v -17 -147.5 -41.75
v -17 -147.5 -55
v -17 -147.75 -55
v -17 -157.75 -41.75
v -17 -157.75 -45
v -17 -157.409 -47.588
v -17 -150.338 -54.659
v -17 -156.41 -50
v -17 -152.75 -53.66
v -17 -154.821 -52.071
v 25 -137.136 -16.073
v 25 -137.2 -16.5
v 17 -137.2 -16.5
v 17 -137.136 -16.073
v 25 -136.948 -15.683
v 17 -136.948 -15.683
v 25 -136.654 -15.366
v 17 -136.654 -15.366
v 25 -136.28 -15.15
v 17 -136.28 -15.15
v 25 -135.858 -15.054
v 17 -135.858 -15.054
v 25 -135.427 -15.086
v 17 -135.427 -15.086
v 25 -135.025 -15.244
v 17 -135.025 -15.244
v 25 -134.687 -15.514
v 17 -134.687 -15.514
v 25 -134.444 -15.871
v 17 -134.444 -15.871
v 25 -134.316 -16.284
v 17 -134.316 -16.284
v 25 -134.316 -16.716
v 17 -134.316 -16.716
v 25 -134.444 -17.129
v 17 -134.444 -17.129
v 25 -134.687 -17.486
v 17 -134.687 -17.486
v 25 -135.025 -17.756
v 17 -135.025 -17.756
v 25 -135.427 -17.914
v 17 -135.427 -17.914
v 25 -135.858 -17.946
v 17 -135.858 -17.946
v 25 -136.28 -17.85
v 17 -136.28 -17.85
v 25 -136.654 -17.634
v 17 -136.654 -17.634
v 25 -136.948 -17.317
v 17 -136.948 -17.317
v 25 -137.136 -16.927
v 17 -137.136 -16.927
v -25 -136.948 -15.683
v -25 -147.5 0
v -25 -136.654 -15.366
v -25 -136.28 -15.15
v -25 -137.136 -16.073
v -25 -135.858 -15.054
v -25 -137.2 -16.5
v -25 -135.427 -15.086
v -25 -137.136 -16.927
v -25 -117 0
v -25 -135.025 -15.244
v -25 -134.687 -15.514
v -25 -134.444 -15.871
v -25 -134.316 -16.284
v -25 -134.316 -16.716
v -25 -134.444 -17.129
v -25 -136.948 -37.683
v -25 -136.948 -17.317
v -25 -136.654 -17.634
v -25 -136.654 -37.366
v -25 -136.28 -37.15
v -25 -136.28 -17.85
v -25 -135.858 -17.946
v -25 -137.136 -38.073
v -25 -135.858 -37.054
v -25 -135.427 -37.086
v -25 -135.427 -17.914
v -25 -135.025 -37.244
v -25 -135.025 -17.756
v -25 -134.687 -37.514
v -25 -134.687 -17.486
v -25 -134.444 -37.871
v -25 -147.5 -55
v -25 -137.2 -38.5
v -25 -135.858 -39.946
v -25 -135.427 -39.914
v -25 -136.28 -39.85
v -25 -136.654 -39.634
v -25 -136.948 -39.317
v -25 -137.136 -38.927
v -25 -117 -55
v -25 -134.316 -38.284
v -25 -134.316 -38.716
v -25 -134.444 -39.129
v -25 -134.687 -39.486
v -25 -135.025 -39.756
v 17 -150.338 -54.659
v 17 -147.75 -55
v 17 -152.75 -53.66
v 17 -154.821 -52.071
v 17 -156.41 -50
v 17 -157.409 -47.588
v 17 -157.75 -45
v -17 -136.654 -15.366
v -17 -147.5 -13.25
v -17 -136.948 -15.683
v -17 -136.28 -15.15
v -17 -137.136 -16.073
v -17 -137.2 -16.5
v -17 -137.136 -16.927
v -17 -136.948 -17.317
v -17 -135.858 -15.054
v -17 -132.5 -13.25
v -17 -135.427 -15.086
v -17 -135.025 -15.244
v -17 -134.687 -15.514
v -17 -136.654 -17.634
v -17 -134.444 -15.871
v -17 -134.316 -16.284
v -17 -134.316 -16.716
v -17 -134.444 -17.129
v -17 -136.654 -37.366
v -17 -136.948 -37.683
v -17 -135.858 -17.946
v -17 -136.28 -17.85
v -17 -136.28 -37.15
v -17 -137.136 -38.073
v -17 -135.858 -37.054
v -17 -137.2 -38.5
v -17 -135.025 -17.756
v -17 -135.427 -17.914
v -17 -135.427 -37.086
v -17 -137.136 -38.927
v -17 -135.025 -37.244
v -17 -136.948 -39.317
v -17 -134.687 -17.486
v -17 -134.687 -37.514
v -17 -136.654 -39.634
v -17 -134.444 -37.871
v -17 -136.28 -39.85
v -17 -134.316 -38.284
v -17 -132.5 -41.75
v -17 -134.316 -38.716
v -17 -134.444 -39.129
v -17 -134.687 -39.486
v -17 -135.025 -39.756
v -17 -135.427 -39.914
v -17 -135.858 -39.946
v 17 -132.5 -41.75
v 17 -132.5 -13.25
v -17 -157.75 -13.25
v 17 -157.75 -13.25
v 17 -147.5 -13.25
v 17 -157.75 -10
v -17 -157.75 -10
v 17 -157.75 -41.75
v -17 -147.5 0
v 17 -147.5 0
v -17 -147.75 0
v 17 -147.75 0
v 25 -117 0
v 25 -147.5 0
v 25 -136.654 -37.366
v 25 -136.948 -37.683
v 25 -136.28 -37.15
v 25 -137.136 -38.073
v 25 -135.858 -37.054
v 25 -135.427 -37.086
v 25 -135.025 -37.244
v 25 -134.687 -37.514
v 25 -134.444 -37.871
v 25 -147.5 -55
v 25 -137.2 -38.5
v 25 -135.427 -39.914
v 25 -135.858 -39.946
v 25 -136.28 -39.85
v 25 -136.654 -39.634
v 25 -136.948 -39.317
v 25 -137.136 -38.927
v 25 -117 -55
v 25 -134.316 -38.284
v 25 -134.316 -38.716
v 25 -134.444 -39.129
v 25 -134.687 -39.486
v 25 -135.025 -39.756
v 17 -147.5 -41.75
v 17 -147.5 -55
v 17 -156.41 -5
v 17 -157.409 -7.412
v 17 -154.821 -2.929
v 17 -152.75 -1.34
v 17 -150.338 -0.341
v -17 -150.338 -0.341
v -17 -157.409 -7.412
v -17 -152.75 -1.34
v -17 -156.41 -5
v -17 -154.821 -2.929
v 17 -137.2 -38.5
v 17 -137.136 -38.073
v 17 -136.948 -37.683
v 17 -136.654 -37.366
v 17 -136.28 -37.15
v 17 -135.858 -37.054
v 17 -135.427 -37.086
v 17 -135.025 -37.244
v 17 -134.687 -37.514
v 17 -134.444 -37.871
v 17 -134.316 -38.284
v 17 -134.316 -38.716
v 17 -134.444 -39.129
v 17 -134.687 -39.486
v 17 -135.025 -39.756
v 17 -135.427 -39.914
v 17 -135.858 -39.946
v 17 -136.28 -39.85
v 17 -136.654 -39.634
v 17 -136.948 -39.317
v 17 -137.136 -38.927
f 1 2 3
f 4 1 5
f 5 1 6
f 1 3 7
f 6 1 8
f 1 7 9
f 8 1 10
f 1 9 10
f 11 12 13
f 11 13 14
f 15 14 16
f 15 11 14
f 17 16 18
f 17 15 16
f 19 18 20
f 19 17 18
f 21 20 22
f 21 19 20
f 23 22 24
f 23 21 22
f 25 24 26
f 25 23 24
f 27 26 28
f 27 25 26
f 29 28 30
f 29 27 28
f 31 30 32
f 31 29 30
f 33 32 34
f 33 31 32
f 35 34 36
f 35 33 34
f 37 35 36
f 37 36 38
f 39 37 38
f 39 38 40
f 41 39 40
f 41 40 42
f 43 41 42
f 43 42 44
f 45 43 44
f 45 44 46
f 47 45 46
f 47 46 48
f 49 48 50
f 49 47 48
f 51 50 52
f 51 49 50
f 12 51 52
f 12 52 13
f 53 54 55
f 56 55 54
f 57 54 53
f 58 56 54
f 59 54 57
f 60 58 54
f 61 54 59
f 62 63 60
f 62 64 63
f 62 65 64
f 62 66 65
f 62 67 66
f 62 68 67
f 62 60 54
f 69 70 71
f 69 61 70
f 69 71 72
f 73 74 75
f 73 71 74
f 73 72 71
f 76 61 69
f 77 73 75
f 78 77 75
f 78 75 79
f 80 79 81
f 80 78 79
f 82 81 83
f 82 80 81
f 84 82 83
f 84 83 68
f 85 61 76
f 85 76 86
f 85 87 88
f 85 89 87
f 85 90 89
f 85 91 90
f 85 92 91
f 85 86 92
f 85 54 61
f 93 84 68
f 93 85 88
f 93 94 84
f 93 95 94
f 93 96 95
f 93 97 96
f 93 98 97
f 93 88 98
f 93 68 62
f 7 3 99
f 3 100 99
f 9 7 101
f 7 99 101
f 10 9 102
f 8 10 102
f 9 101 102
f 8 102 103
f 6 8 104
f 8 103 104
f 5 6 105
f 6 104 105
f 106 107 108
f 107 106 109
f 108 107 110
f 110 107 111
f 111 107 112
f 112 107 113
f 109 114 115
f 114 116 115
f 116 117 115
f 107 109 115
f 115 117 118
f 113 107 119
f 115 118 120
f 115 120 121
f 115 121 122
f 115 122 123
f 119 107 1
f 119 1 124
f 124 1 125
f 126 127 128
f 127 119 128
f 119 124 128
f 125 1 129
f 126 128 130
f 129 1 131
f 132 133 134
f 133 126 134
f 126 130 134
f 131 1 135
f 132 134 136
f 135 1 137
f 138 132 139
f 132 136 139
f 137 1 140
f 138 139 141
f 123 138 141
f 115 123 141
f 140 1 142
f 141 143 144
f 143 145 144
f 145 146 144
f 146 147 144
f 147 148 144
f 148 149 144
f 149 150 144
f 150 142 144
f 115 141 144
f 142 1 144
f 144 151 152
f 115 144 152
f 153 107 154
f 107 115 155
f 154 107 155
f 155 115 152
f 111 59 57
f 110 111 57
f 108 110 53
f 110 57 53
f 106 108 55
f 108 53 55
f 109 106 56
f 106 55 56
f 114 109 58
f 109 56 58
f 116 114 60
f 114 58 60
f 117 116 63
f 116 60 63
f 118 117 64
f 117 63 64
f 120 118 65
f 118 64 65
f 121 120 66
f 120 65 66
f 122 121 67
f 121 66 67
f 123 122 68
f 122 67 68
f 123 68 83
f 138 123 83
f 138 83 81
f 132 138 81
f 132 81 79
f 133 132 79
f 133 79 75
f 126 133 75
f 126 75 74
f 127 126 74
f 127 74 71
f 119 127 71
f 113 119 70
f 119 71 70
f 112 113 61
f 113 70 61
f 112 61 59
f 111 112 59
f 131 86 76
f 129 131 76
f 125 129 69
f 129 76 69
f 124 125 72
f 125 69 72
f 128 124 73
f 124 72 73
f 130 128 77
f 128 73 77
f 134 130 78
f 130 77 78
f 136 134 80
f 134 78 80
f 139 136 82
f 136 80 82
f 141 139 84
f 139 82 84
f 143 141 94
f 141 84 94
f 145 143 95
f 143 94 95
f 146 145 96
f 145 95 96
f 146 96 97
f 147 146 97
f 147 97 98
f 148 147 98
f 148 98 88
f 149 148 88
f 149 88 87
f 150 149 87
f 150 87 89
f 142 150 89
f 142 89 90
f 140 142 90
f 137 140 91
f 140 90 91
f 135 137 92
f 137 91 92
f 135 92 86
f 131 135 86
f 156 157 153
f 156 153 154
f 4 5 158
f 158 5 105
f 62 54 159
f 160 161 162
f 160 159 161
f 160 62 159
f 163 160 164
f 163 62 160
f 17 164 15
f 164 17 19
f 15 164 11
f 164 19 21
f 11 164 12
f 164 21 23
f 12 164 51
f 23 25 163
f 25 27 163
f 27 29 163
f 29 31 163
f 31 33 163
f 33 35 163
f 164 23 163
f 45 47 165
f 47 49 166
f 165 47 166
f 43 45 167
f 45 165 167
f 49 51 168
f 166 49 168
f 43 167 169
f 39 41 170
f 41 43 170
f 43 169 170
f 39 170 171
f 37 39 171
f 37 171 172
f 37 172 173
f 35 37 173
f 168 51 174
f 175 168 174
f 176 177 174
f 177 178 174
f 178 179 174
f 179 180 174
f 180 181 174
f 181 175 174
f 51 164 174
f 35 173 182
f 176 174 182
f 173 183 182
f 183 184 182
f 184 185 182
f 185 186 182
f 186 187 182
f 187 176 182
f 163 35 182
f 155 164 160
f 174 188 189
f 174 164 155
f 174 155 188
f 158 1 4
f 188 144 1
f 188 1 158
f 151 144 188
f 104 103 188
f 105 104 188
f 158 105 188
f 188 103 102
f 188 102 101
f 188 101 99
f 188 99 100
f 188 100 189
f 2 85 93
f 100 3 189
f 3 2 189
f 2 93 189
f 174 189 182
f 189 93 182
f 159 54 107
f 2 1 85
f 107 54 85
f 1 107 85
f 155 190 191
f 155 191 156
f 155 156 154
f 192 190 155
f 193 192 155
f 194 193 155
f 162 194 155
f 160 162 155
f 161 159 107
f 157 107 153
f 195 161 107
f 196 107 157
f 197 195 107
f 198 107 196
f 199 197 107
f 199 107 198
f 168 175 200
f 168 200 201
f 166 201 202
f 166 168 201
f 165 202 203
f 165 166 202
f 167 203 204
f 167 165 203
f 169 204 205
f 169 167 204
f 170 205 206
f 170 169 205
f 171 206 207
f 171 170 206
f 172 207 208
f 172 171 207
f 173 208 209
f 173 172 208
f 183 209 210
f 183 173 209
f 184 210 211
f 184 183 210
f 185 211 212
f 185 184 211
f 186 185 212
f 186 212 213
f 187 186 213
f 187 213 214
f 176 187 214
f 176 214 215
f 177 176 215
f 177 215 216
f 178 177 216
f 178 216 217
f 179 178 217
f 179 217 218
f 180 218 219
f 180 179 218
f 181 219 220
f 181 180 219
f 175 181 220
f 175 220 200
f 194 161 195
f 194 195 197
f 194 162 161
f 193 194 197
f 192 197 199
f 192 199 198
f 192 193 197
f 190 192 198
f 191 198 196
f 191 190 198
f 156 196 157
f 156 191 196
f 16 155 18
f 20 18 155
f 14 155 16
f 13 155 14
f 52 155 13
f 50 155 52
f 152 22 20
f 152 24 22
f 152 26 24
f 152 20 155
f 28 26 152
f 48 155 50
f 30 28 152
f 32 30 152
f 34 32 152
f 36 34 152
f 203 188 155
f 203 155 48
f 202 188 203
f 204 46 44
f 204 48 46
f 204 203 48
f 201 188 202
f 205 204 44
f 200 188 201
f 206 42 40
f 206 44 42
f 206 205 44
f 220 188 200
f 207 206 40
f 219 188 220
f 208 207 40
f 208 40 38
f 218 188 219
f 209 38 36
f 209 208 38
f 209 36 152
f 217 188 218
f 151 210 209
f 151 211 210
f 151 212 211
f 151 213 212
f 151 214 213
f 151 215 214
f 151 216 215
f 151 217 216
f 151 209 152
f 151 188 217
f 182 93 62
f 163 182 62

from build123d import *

# Parameters (mm, degrees)
SKETCH1_W           = 50
SKETCH1_H           = 170
BOSS_EXTRUDE1_DEPTH = 55
SKETCH2_W           = 34
SKETCH2_H           = 27
CUT_EXTRUDE1_DEPTH  = 181.416185527
SKETCH3_W           = 10
SKETCH3_H           = 24
SKETCH3_R           = 4.25
SKETCH3_R_2         = 1
CUT_EXTRUDE2_DEPTH  = 186.539753153
SKETCH4_W           = 2
SKETCH4_H           = 24
CUT_EXTRUDE3_DEPTH  = 178.623196683
SKETCH5_W           = 6.25
SKETCH5_H           = 11.25
CUT_EXTRUDE4_DEPTH  = 186.539753153
SKETCH6_W           = 38
SKETCH6_H           = 10
CUT_EXTRUDE5_DEPTH  = 181.416185527
SKETCH8_W           = 13.25
SKETCH8_H           = 2.25
CUT_EXTRUDE7_DEPTH  = 186.539753153
SKETCH9_W           = 34
SKETCH9_H           = 35.25
CUT_EXTRUDE8_DEPTH  = 179.297679458
SKETCH11_W          = 13.25
SKETCH11_H          = 20.25
CUT_EXTRUDE9_DEPTH  = 184.480414486
SKETCH12_W          = 28.5
SKETCH12_H          = 15
BOSS_EXTRUDE2_DEPTH = 8
SKETCH14_W          = 34
SKETCH14_H          = 15
SKETCH14_H_2        = 10.25
BOSS_EXTRUDE3_DEPTH = 13.25
SKETCH16_R          = 4.5
SKETCH16_R_2        = 2.5
CUT_EXTRUDE13_DEPTH = 8
SKETCH17_W          = 16.25
SKETCH17_H          = 18
CUT_EXTRUDE14_DEPTH = 175.384811552
CUT_EXTRUDE15_DEPTH = 175.384811552
SKETCH20_W          = 42
SKETCH20_H          = 6.25
SKETCH20_H_2        = 18
SKETCH20_H_3        = 58.75
CUT_EXTRUDE18_DEPTH = 169.923244404
SKETCH22_R          = 4.5
SKETCH22_R_2        = 1.45
BOSS_EXTRUDE4_DEPTH = 8
SKETCH23_W          = 2
SKETCH23_H          = 10
CUT_EXTRUDE19_DEPTH = 165.352137193
FILLET1_R           = 10
SKETCH24_W          = 55
SKETCH24_H          = 55
CUT_EXTRUDE20_DEPTH = 175.384811552
SKETCH25_W          = 109.643028434
SKETCH25_H          = 82.573484069
CUT_EXTRUDE21_DEPTH = 175.384811552


with BuildPart() as part:
    # Sketch1 → Boss-Extrude1 (new body)
    with BuildSketch(Plane.XY):
        with Locations((0, -85)):
            Rectangle(SKETCH1_W, SKETCH1_H)
    extrude(amount=-BOSS_EXTRUDE1_DEPTH)

    # Sketch2 → Cut-Extrude1 (cut, through all)
    with BuildSketch(Plane.XY):
        with Locations((0, -13.5)):
            Rectangle(SKETCH2_W, SKETCH2_H)
    extrude(amount=-CUT_EXTRUDE1_DEPTH, mode=Mode.SUBTRACT)

    # Sketch3 → Cut-Extrude2 (cut, through all)
    with BuildSketch(Plane(origin=(25, 0, 0), x_dir=(0, 0, -1), z_dir=(1, 0, 0))):
        with Locations((50, -12)):
            Rectangle(SKETCH3_W, SKETCH3_H)
        with Locations((5, -12)):
            Rectangle(SKETCH3_W, SKETCH3_H)
        with Locations(Location((27.5, -12.75, 0), (0, 0, 90))):
            Circle(SKETCH3_R)
        with Locations(Location((35.5, -12.75, 0), (0, 0, 90))):
            Circle(SKETCH3_R_2)
        with Locations(Location((27.5, -4.75, 0), (0, 0, 90))):
            Circle(SKETCH3_R_2)
        with Locations(Location((27.5, -20.75, 0), (0, 0, 90))):
            Circle(SKETCH3_R_2)
        with Locations(Location((19.5, -12.75, 0), (0, 0, 90))):
            Circle(SKETCH3_R_2)
    extrude(amount=-CUT_EXTRUDE2_DEPTH, mode=Mode.SUBTRACT)

    # Sketch4 → Cut-Extrude3 (cut, through all)
    with BuildSketch(Plane.XY.offset(-10)):
        with Locations((-18, -12)):
            Rectangle(SKETCH4_W, SKETCH4_H)
        with Locations((18, -12)):
            Rectangle(SKETCH4_W, SKETCH4_H)
    extrude(amount=-CUT_EXTRUDE3_DEPTH, mode=Mode.SUBTRACT)

    # Sketch5 → Cut-Extrude4 (cut, through all)
    with BuildSketch(Plane(origin=(25, 0, 0), x_dir=(0, 0, -1), z_dir=(1, 0, 0))):
        with BuildLine():
            Line((45, 0), (10, 0))
            Line((10, 0), (10, -12.75))
            Line((10, -12.75), (16.25, -12.75))
            ThreePointArc((16.25, -12.75), (27.5, -1.5), (38.75, -12.75))
            Line((38.75, -12.75), (45, -12.75))
            Line((45, -12.75), (45, 0))
        make_face()
        with Locations((13.125, -18.375)):
            Rectangle(SKETCH5_W, SKETCH5_H)
        with Locations((41.875, -18.375)):
            Rectangle(SKETCH5_W, SKETCH5_H)
    extrude(amount=-CUT_EXTRUDE4_DEPTH, mode=Mode.SUBTRACT)

    # Sketch6 → Cut-Extrude5 (cut, through all)
    with BuildSketch(Plane.XY):
        with Locations((0, -29)):
            Rectangle(SKETCH6_W, SKETCH6_H)
    extrude(amount=-CUT_EXTRUDE5_DEPTH, mode=Mode.SUBTRACT)

    # Sketch8 → Cut-Extrude7 (cut, through all)
    with BuildSketch(Plane(origin=(25, 0, 0), x_dir=(0, 0, -1), z_dir=(1, 0, 0))):
        with BuildLine():
            Line((27.5, -157.5), (27.5, -132.5))
            Line((27.5, -132.5), (13.25, -132.5))
            Line((13.25, -132.5), (13.25, -167.75))
            Line((13.25, -167.75), (17.25, -167.75))
            ThreePointArc((17.25, -167.75), (20.252155493, -160.502155493), (27.5, -157.5))
        make_face()
        with BuildLine():
            Line((41.75, -167.75), (41.75, -132.5))
            Line((41.75, -132.5), (27.5, -132.5))
            Line((27.5, -132.5), (27.5, -157.5))
            ThreePointArc((27.5, -157.5), (34.747844507, -160.502155493), (37.75, -167.75))
            Line((37.75, -167.75), (41.75, -167.75))
        make_face()
        with Locations((48.375, -168.875)):
            Rectangle(SKETCH8_W, SKETCH8_H)
        with Locations((6.625, -168.875)):
            Rectangle(SKETCH8_W, SKETCH8_H)
        with BuildLine():
            Line((17.25, -167.75), (13.25, -167.75))
            Line((13.25, -167.75), (13.25, -170))
            Line((13.25, -170), (17.5, -170))
            ThreePointArc((17.5, -170), (17.31269172, -168.881923142), (17.25, -167.75))
        make_face()
        with BuildLine():
            Line((41.75, -170), (41.75, -167.75))
            Line((41.75, -167.75), (37.75, -167.75))
            ThreePointArc((37.75, -167.75), (37.68730828, -168.881923142), (37.5, -170))
            Line((37.5, -170), (41.75, -170))
        make_face()
        with BuildLine():
            Line((27.5, -167.75), (27.5, -157.5))
            ThreePointArc((27.5, -157.5), (20.252155493, -160.502155493), (17.25, -167.75))
            Line((17.25, -167.75), (27.5, -167.75))
        make_face()
        with BuildLine():
            ThreePointArc((37.75, -167.75), (34.747844507, -160.502155493), (27.5, -157.5))
            Line((27.5, -157.5), (27.5, -167.75))
            Line((27.5, -167.75), (37.75, -167.75))
        make_face()
        with BuildLine():
            Line((27.5, -170), (27.5, -167.75))
            Line((27.5, -167.75), (17.25, -167.75))
            ThreePointArc((17.25, -167.75), (17.31269172, -168.881923142), (17.5, -170))
            Line((17.5, -170), (27.5, -170))
        make_face()
        with BuildLine():
            ThreePointArc((37.5, -170), (37.68730828, -168.881923142), (37.75, -167.75))
            Line((37.75, -167.75), (27.5, -167.75))
            Line((27.5, -167.75), (27.5, -170))
            Line((27.5, -170), (37.5, -170))
        make_face()
    extrude(amount=-CUT_EXTRUDE7_DEPTH, mode=Mode.SUBTRACT)

    # Sketch9 → Cut-Extrude8 (cut, through all)
    with BuildSketch(Plane.XY):
        with Locations((0, -150.125)):
            Rectangle(SKETCH9_W, SKETCH9_H)
    extrude(amount=-CUT_EXTRUDE8_DEPTH, mode=Mode.SUBTRACT)

    # Sketch11 → Cut-Extrude9 (cut, through all)
    with BuildSketch(Plane(origin=(25, 0, 0), x_dir=(0, 0, -1), z_dir=(1, 0, 0))):
        with BuildLine():
            ThreePointArc((17.25, -167.75), (20.252155493, -160.502155493), (27.5, -157.5))
            Line((27.5, -157.5), (27.5, -147.5))
            Line((27.5, -147.5), (13.25, -147.5))
            Line((13.25, -147.5), (13.25, -167.75))
            Line((13.25, -167.75), (17.25, -167.75))
        make_face()
        with BuildLine():
            Line((27.5, -147.5), (27.5, -157.5))
            ThreePointArc((27.5, -157.5), (34.747844507, -160.502155493), (37.75, -167.75))
            Line((37.75, -167.75), (41.75, -167.75))
            Line((41.75, -167.75), (41.75, -147.5))
            Line((41.75, -147.5), (27.5, -147.5))
        make_face()
        with Locations((48.375, -157.625)):
            Rectangle(SKETCH11_W, SKETCH11_H)
        with Locations((6.625, -157.625)):
            Rectangle(SKETCH11_W, SKETCH11_H)
    extrude(amount=-CUT_EXTRUDE9_DEPTH, mode=Mode.SUBTRACT)

    # Sketch12 → Boss-Extrude2 (add)
    with BuildSketch(Plane(origin=(25, 0, 0), x_dir=(0, 0, -1), z_dir=(1, 0, 0))):
        with Locations((27.5, -140)):
            Rectangle(SKETCH12_W, SKETCH12_H)
    boss_extrude2 = extrude(amount=-BOSS_EXTRUDE2_DEPTH)

    # Mirror1: Boss-Extrude2 across plane
    add(boss_extrude2.mirror(Plane(origin=(0, 0, 0), x_dir=(0, 0, 1), z_dir=(1, 0, 0))))

    # Sketch14 → Boss-Extrude3 (add)
    with BuildSketch(Plane.XY):
        with Locations((0, -140)):
            Rectangle(SKETCH14_W, SKETCH14_H)
        with Locations((0, -152.625)):
            Rectangle(SKETCH14_W, SKETCH14_H_2)
    boss_extrude3 = extrude(amount=-BOSS_EXTRUDE3_DEPTH)

    # Mirror2: Boss-Extrude3 across plane
    add(boss_extrude3.mirror(Plane.XY.offset(-27.5)))

    # Sketch16 → Cut-Extrude13 (cut)
    # profile 1 of 3: a face of its own
    with BuildSketch(Plane(origin=(25, 0, 0), x_dir=(0, 0, -1), z_dir=(1, 0, 0))):
        with Locations(Location((16.5, -135.75, 0), (0, 0, 90))):
            Circle(SKETCH16_R)
        with Locations((16.5, -135.75)):
            Circle(SKETCH16_R_2, mode=Mode.SUBTRACT)
    # profile 2 of 3: a face of its own
    with BuildSketch(Plane(origin=(25, 0, 0), x_dir=(0, 0, -1), z_dir=(1, 0, 0))):
        with Locations((16.5, -135.75)):
            Circle(SKETCH16_R_2)
    # profile 3 of 3: a face of its own
    with BuildSketch(Plane(origin=(25, 0, 0), x_dir=(0, 0, -1), z_dir=(1, 0, 0))):
        with Locations(Location((38.5, -135.75, 0), (0, 0, 90))):
            Circle(SKETCH16_R)
    cut_extrude13 = extrude(amount=-CUT_EXTRUDE13_DEPTH, mode=Mode.SUBTRACT)

    # Mirror3: Cut-Extrude13 across plane
    add(cut_extrude13.mirror(Plane(origin=(0, 0, 0), x_dir=(0, 0, 1), z_dir=(1, 0, 0))), mode=Mode.SUBTRACT)

    # Sketch17 → Cut-Extrude14 (cut, through all)
    with BuildSketch(Plane(origin=(25, 0, 0), x_dir=(0, 0, -1), z_dir=(1, 0, 0))):
        with Locations((46.875, -33)):
            Rectangle(SKETCH17_W, SKETCH17_H)
        with Locations((8.125, -33)):
            Rectangle(SKETCH17_W, SKETCH17_H)
    extrude(amount=-CUT_EXTRUDE14_DEPTH, mode=Mode.SUBTRACT)

    # Sketch18 → Cut-Extrude15 (cut, through all)
    with BuildSketch(Plane(origin=(25, 0, 0), x_dir=(0, 0, -1), z_dir=(1, 0, 0))):
        with BuildLine():
            ThreePointArc((0, -58.25), (4.759514806, -46.759514806), (16.25, -42))
            Line((16.25, -42), (0, -42))
            Line((0, -42), (0, -58.25))
        make_face()
        with BuildLine():
            Line((55, -42), (38.75, -42))
            ThreePointArc((38.75, -42), (50.240485194, -46.759514806), (55, -58.25))
            Line((55, -58.25), (55, -42))
        make_face()
    extrude(amount=-CUT_EXTRUDE15_DEPTH, mode=Mode.SUBTRACT)

    # Sketch20 → Cut-Extrude18 (cut, through all)
    with BuildSketch(Plane(origin=(0, 0, -55), x_dir=(-1, 0, 0), z_dir=(0, 0, -1))):
        with Locations((0, -55.125)):
            Rectangle(SKETCH20_W, SKETCH20_H)
        with Locations((0, -43)):
            Rectangle(SKETCH20_W, SKETCH20_H_2)
        with Locations((0, -87.625)):
            Rectangle(SKETCH20_W, SKETCH20_H_3)
    extrude(amount=-CUT_EXTRUDE18_DEPTH, mode=Mode.SUBTRACT)

    # Sketch22 → Boss-Extrude4 (add)
    # profile 1 of 2: a face of its own
    with BuildSketch(Plane.ZY.offset(25)):
        with Locations(Location((-38.5, -135.75, 0), (0, 0, 90))):
            Circle(SKETCH22_R)
        with Locations(Location((-38.5, -135.75, 0), (0, 0, 270))):
            Circle(SKETCH22_R_2, mode=Mode.SUBTRACT)
    # profile 2 of 2: a face of its own
    with BuildSketch(Plane.ZY.offset(25)):
        with Locations(Location((-16.5, -135.75, 0), (0, 0, 90))):
            Circle(SKETCH22_R)
        with Locations(Location((-16.5, -135.75, 0), (0, 0, 270))):
            Circle(SKETCH22_R_2, mode=Mode.SUBTRACT)
    boss_extrude4 = extrude(amount=-BOSS_EXTRUDE4_DEPTH)

    # Mirror4: Boss-Extrude4 across plane
    add(boss_extrude4.mirror(Plane(origin=(0, 0, 0), x_dir=(0, 0, 1), z_dir=(1, 0, 0))))

    # Sketch23 → Cut-Extrude19 (cut, through all)
    with BuildSketch(Plane(origin=(0, 0, -38.75), x_dir=(-1, 0, 0), z_dir=(0, 0, -1))):
        with Locations((-20, -29)):
            Rectangle(SKETCH23_W, SKETCH23_H)
        with Locations((20, -29)):
            Rectangle(SKETCH23_W, SKETCH23_H)
    extrude(amount=-CUT_EXTRUDE19_DEPTH, mode=Mode.SUBTRACT)

    # Fillet1
    fillet1_edges = [part.edges().sort_by_distance(p)[0] for p in [
        (0, -157.75, 0),
        (0, -157.75, -55),
    ]]
    fillet(fillet1_edges, radius=FILLET1_R)

    # Sketch24 → Cut-Extrude20 (cut, through all)
    with BuildSketch(Plane.ZY.offset(25)):
        with Locations((-27.5, -89.5)):
            Rectangle(SKETCH24_W, SKETCH24_H)
    extrude(amount=-CUT_EXTRUDE20_DEPTH, mode=Mode.SUBTRACT)


with BuildPart() as cut_extrude20_piece_1:
    # of the separate pieces the step leaves, piece 1, a body of its own (cut_extrude20_pieces)
    add(part.part.solids().sort_by_distance((17, -147.75, 0))[0])


with BuildPart() as cut_extrude20_piece_2:
    # of the separate pieces the step leaves, piece 2, a body of its own (cut_extrude20_pieces)
    add(part.part.solids().sort_by_distance((25, -58.25, 0))[0])


with BuildPart() as cut_extrude20_piece_3:
    # of the separate pieces the step leaves, piece 3, a body of its own (cut_extrude20_pieces)
    add(part.part.solids().sort_by_distance((-25, -62, 0))[0])


with BuildPart() as cut_extrude21_tool:
    # Sketch25 → Cut-Extrude21 (new, through all)
    with BuildSketch(Plane.ZY.offset(25)):
        with Locations((-25.125575684, -34.55424545)):
            Rectangle(SKETCH25_W, SKETCH25_H)
    extrude(amount=-CUT_EXTRUDE21_DEPTH)


with BuildPart() as cut_extrude20_piece_2_1:
    add(cut_extrude20_piece_2.part)

    # Cut-Extrude21: cut by cut_extrude21_tool
    add(cut_extrude21_tool.part, mode=Mode.SUBTRACT)


with BuildPart() as cut_extrude20_piece_3_1:
    add(cut_extrude20_piece_3.part)

    # Cut-Extrude21: cut by cut_extrude21_tool
    add(cut_extrude21_tool.part, mode=Mode.SUBTRACT)


solid = cut_extrude20_piece_1.part
